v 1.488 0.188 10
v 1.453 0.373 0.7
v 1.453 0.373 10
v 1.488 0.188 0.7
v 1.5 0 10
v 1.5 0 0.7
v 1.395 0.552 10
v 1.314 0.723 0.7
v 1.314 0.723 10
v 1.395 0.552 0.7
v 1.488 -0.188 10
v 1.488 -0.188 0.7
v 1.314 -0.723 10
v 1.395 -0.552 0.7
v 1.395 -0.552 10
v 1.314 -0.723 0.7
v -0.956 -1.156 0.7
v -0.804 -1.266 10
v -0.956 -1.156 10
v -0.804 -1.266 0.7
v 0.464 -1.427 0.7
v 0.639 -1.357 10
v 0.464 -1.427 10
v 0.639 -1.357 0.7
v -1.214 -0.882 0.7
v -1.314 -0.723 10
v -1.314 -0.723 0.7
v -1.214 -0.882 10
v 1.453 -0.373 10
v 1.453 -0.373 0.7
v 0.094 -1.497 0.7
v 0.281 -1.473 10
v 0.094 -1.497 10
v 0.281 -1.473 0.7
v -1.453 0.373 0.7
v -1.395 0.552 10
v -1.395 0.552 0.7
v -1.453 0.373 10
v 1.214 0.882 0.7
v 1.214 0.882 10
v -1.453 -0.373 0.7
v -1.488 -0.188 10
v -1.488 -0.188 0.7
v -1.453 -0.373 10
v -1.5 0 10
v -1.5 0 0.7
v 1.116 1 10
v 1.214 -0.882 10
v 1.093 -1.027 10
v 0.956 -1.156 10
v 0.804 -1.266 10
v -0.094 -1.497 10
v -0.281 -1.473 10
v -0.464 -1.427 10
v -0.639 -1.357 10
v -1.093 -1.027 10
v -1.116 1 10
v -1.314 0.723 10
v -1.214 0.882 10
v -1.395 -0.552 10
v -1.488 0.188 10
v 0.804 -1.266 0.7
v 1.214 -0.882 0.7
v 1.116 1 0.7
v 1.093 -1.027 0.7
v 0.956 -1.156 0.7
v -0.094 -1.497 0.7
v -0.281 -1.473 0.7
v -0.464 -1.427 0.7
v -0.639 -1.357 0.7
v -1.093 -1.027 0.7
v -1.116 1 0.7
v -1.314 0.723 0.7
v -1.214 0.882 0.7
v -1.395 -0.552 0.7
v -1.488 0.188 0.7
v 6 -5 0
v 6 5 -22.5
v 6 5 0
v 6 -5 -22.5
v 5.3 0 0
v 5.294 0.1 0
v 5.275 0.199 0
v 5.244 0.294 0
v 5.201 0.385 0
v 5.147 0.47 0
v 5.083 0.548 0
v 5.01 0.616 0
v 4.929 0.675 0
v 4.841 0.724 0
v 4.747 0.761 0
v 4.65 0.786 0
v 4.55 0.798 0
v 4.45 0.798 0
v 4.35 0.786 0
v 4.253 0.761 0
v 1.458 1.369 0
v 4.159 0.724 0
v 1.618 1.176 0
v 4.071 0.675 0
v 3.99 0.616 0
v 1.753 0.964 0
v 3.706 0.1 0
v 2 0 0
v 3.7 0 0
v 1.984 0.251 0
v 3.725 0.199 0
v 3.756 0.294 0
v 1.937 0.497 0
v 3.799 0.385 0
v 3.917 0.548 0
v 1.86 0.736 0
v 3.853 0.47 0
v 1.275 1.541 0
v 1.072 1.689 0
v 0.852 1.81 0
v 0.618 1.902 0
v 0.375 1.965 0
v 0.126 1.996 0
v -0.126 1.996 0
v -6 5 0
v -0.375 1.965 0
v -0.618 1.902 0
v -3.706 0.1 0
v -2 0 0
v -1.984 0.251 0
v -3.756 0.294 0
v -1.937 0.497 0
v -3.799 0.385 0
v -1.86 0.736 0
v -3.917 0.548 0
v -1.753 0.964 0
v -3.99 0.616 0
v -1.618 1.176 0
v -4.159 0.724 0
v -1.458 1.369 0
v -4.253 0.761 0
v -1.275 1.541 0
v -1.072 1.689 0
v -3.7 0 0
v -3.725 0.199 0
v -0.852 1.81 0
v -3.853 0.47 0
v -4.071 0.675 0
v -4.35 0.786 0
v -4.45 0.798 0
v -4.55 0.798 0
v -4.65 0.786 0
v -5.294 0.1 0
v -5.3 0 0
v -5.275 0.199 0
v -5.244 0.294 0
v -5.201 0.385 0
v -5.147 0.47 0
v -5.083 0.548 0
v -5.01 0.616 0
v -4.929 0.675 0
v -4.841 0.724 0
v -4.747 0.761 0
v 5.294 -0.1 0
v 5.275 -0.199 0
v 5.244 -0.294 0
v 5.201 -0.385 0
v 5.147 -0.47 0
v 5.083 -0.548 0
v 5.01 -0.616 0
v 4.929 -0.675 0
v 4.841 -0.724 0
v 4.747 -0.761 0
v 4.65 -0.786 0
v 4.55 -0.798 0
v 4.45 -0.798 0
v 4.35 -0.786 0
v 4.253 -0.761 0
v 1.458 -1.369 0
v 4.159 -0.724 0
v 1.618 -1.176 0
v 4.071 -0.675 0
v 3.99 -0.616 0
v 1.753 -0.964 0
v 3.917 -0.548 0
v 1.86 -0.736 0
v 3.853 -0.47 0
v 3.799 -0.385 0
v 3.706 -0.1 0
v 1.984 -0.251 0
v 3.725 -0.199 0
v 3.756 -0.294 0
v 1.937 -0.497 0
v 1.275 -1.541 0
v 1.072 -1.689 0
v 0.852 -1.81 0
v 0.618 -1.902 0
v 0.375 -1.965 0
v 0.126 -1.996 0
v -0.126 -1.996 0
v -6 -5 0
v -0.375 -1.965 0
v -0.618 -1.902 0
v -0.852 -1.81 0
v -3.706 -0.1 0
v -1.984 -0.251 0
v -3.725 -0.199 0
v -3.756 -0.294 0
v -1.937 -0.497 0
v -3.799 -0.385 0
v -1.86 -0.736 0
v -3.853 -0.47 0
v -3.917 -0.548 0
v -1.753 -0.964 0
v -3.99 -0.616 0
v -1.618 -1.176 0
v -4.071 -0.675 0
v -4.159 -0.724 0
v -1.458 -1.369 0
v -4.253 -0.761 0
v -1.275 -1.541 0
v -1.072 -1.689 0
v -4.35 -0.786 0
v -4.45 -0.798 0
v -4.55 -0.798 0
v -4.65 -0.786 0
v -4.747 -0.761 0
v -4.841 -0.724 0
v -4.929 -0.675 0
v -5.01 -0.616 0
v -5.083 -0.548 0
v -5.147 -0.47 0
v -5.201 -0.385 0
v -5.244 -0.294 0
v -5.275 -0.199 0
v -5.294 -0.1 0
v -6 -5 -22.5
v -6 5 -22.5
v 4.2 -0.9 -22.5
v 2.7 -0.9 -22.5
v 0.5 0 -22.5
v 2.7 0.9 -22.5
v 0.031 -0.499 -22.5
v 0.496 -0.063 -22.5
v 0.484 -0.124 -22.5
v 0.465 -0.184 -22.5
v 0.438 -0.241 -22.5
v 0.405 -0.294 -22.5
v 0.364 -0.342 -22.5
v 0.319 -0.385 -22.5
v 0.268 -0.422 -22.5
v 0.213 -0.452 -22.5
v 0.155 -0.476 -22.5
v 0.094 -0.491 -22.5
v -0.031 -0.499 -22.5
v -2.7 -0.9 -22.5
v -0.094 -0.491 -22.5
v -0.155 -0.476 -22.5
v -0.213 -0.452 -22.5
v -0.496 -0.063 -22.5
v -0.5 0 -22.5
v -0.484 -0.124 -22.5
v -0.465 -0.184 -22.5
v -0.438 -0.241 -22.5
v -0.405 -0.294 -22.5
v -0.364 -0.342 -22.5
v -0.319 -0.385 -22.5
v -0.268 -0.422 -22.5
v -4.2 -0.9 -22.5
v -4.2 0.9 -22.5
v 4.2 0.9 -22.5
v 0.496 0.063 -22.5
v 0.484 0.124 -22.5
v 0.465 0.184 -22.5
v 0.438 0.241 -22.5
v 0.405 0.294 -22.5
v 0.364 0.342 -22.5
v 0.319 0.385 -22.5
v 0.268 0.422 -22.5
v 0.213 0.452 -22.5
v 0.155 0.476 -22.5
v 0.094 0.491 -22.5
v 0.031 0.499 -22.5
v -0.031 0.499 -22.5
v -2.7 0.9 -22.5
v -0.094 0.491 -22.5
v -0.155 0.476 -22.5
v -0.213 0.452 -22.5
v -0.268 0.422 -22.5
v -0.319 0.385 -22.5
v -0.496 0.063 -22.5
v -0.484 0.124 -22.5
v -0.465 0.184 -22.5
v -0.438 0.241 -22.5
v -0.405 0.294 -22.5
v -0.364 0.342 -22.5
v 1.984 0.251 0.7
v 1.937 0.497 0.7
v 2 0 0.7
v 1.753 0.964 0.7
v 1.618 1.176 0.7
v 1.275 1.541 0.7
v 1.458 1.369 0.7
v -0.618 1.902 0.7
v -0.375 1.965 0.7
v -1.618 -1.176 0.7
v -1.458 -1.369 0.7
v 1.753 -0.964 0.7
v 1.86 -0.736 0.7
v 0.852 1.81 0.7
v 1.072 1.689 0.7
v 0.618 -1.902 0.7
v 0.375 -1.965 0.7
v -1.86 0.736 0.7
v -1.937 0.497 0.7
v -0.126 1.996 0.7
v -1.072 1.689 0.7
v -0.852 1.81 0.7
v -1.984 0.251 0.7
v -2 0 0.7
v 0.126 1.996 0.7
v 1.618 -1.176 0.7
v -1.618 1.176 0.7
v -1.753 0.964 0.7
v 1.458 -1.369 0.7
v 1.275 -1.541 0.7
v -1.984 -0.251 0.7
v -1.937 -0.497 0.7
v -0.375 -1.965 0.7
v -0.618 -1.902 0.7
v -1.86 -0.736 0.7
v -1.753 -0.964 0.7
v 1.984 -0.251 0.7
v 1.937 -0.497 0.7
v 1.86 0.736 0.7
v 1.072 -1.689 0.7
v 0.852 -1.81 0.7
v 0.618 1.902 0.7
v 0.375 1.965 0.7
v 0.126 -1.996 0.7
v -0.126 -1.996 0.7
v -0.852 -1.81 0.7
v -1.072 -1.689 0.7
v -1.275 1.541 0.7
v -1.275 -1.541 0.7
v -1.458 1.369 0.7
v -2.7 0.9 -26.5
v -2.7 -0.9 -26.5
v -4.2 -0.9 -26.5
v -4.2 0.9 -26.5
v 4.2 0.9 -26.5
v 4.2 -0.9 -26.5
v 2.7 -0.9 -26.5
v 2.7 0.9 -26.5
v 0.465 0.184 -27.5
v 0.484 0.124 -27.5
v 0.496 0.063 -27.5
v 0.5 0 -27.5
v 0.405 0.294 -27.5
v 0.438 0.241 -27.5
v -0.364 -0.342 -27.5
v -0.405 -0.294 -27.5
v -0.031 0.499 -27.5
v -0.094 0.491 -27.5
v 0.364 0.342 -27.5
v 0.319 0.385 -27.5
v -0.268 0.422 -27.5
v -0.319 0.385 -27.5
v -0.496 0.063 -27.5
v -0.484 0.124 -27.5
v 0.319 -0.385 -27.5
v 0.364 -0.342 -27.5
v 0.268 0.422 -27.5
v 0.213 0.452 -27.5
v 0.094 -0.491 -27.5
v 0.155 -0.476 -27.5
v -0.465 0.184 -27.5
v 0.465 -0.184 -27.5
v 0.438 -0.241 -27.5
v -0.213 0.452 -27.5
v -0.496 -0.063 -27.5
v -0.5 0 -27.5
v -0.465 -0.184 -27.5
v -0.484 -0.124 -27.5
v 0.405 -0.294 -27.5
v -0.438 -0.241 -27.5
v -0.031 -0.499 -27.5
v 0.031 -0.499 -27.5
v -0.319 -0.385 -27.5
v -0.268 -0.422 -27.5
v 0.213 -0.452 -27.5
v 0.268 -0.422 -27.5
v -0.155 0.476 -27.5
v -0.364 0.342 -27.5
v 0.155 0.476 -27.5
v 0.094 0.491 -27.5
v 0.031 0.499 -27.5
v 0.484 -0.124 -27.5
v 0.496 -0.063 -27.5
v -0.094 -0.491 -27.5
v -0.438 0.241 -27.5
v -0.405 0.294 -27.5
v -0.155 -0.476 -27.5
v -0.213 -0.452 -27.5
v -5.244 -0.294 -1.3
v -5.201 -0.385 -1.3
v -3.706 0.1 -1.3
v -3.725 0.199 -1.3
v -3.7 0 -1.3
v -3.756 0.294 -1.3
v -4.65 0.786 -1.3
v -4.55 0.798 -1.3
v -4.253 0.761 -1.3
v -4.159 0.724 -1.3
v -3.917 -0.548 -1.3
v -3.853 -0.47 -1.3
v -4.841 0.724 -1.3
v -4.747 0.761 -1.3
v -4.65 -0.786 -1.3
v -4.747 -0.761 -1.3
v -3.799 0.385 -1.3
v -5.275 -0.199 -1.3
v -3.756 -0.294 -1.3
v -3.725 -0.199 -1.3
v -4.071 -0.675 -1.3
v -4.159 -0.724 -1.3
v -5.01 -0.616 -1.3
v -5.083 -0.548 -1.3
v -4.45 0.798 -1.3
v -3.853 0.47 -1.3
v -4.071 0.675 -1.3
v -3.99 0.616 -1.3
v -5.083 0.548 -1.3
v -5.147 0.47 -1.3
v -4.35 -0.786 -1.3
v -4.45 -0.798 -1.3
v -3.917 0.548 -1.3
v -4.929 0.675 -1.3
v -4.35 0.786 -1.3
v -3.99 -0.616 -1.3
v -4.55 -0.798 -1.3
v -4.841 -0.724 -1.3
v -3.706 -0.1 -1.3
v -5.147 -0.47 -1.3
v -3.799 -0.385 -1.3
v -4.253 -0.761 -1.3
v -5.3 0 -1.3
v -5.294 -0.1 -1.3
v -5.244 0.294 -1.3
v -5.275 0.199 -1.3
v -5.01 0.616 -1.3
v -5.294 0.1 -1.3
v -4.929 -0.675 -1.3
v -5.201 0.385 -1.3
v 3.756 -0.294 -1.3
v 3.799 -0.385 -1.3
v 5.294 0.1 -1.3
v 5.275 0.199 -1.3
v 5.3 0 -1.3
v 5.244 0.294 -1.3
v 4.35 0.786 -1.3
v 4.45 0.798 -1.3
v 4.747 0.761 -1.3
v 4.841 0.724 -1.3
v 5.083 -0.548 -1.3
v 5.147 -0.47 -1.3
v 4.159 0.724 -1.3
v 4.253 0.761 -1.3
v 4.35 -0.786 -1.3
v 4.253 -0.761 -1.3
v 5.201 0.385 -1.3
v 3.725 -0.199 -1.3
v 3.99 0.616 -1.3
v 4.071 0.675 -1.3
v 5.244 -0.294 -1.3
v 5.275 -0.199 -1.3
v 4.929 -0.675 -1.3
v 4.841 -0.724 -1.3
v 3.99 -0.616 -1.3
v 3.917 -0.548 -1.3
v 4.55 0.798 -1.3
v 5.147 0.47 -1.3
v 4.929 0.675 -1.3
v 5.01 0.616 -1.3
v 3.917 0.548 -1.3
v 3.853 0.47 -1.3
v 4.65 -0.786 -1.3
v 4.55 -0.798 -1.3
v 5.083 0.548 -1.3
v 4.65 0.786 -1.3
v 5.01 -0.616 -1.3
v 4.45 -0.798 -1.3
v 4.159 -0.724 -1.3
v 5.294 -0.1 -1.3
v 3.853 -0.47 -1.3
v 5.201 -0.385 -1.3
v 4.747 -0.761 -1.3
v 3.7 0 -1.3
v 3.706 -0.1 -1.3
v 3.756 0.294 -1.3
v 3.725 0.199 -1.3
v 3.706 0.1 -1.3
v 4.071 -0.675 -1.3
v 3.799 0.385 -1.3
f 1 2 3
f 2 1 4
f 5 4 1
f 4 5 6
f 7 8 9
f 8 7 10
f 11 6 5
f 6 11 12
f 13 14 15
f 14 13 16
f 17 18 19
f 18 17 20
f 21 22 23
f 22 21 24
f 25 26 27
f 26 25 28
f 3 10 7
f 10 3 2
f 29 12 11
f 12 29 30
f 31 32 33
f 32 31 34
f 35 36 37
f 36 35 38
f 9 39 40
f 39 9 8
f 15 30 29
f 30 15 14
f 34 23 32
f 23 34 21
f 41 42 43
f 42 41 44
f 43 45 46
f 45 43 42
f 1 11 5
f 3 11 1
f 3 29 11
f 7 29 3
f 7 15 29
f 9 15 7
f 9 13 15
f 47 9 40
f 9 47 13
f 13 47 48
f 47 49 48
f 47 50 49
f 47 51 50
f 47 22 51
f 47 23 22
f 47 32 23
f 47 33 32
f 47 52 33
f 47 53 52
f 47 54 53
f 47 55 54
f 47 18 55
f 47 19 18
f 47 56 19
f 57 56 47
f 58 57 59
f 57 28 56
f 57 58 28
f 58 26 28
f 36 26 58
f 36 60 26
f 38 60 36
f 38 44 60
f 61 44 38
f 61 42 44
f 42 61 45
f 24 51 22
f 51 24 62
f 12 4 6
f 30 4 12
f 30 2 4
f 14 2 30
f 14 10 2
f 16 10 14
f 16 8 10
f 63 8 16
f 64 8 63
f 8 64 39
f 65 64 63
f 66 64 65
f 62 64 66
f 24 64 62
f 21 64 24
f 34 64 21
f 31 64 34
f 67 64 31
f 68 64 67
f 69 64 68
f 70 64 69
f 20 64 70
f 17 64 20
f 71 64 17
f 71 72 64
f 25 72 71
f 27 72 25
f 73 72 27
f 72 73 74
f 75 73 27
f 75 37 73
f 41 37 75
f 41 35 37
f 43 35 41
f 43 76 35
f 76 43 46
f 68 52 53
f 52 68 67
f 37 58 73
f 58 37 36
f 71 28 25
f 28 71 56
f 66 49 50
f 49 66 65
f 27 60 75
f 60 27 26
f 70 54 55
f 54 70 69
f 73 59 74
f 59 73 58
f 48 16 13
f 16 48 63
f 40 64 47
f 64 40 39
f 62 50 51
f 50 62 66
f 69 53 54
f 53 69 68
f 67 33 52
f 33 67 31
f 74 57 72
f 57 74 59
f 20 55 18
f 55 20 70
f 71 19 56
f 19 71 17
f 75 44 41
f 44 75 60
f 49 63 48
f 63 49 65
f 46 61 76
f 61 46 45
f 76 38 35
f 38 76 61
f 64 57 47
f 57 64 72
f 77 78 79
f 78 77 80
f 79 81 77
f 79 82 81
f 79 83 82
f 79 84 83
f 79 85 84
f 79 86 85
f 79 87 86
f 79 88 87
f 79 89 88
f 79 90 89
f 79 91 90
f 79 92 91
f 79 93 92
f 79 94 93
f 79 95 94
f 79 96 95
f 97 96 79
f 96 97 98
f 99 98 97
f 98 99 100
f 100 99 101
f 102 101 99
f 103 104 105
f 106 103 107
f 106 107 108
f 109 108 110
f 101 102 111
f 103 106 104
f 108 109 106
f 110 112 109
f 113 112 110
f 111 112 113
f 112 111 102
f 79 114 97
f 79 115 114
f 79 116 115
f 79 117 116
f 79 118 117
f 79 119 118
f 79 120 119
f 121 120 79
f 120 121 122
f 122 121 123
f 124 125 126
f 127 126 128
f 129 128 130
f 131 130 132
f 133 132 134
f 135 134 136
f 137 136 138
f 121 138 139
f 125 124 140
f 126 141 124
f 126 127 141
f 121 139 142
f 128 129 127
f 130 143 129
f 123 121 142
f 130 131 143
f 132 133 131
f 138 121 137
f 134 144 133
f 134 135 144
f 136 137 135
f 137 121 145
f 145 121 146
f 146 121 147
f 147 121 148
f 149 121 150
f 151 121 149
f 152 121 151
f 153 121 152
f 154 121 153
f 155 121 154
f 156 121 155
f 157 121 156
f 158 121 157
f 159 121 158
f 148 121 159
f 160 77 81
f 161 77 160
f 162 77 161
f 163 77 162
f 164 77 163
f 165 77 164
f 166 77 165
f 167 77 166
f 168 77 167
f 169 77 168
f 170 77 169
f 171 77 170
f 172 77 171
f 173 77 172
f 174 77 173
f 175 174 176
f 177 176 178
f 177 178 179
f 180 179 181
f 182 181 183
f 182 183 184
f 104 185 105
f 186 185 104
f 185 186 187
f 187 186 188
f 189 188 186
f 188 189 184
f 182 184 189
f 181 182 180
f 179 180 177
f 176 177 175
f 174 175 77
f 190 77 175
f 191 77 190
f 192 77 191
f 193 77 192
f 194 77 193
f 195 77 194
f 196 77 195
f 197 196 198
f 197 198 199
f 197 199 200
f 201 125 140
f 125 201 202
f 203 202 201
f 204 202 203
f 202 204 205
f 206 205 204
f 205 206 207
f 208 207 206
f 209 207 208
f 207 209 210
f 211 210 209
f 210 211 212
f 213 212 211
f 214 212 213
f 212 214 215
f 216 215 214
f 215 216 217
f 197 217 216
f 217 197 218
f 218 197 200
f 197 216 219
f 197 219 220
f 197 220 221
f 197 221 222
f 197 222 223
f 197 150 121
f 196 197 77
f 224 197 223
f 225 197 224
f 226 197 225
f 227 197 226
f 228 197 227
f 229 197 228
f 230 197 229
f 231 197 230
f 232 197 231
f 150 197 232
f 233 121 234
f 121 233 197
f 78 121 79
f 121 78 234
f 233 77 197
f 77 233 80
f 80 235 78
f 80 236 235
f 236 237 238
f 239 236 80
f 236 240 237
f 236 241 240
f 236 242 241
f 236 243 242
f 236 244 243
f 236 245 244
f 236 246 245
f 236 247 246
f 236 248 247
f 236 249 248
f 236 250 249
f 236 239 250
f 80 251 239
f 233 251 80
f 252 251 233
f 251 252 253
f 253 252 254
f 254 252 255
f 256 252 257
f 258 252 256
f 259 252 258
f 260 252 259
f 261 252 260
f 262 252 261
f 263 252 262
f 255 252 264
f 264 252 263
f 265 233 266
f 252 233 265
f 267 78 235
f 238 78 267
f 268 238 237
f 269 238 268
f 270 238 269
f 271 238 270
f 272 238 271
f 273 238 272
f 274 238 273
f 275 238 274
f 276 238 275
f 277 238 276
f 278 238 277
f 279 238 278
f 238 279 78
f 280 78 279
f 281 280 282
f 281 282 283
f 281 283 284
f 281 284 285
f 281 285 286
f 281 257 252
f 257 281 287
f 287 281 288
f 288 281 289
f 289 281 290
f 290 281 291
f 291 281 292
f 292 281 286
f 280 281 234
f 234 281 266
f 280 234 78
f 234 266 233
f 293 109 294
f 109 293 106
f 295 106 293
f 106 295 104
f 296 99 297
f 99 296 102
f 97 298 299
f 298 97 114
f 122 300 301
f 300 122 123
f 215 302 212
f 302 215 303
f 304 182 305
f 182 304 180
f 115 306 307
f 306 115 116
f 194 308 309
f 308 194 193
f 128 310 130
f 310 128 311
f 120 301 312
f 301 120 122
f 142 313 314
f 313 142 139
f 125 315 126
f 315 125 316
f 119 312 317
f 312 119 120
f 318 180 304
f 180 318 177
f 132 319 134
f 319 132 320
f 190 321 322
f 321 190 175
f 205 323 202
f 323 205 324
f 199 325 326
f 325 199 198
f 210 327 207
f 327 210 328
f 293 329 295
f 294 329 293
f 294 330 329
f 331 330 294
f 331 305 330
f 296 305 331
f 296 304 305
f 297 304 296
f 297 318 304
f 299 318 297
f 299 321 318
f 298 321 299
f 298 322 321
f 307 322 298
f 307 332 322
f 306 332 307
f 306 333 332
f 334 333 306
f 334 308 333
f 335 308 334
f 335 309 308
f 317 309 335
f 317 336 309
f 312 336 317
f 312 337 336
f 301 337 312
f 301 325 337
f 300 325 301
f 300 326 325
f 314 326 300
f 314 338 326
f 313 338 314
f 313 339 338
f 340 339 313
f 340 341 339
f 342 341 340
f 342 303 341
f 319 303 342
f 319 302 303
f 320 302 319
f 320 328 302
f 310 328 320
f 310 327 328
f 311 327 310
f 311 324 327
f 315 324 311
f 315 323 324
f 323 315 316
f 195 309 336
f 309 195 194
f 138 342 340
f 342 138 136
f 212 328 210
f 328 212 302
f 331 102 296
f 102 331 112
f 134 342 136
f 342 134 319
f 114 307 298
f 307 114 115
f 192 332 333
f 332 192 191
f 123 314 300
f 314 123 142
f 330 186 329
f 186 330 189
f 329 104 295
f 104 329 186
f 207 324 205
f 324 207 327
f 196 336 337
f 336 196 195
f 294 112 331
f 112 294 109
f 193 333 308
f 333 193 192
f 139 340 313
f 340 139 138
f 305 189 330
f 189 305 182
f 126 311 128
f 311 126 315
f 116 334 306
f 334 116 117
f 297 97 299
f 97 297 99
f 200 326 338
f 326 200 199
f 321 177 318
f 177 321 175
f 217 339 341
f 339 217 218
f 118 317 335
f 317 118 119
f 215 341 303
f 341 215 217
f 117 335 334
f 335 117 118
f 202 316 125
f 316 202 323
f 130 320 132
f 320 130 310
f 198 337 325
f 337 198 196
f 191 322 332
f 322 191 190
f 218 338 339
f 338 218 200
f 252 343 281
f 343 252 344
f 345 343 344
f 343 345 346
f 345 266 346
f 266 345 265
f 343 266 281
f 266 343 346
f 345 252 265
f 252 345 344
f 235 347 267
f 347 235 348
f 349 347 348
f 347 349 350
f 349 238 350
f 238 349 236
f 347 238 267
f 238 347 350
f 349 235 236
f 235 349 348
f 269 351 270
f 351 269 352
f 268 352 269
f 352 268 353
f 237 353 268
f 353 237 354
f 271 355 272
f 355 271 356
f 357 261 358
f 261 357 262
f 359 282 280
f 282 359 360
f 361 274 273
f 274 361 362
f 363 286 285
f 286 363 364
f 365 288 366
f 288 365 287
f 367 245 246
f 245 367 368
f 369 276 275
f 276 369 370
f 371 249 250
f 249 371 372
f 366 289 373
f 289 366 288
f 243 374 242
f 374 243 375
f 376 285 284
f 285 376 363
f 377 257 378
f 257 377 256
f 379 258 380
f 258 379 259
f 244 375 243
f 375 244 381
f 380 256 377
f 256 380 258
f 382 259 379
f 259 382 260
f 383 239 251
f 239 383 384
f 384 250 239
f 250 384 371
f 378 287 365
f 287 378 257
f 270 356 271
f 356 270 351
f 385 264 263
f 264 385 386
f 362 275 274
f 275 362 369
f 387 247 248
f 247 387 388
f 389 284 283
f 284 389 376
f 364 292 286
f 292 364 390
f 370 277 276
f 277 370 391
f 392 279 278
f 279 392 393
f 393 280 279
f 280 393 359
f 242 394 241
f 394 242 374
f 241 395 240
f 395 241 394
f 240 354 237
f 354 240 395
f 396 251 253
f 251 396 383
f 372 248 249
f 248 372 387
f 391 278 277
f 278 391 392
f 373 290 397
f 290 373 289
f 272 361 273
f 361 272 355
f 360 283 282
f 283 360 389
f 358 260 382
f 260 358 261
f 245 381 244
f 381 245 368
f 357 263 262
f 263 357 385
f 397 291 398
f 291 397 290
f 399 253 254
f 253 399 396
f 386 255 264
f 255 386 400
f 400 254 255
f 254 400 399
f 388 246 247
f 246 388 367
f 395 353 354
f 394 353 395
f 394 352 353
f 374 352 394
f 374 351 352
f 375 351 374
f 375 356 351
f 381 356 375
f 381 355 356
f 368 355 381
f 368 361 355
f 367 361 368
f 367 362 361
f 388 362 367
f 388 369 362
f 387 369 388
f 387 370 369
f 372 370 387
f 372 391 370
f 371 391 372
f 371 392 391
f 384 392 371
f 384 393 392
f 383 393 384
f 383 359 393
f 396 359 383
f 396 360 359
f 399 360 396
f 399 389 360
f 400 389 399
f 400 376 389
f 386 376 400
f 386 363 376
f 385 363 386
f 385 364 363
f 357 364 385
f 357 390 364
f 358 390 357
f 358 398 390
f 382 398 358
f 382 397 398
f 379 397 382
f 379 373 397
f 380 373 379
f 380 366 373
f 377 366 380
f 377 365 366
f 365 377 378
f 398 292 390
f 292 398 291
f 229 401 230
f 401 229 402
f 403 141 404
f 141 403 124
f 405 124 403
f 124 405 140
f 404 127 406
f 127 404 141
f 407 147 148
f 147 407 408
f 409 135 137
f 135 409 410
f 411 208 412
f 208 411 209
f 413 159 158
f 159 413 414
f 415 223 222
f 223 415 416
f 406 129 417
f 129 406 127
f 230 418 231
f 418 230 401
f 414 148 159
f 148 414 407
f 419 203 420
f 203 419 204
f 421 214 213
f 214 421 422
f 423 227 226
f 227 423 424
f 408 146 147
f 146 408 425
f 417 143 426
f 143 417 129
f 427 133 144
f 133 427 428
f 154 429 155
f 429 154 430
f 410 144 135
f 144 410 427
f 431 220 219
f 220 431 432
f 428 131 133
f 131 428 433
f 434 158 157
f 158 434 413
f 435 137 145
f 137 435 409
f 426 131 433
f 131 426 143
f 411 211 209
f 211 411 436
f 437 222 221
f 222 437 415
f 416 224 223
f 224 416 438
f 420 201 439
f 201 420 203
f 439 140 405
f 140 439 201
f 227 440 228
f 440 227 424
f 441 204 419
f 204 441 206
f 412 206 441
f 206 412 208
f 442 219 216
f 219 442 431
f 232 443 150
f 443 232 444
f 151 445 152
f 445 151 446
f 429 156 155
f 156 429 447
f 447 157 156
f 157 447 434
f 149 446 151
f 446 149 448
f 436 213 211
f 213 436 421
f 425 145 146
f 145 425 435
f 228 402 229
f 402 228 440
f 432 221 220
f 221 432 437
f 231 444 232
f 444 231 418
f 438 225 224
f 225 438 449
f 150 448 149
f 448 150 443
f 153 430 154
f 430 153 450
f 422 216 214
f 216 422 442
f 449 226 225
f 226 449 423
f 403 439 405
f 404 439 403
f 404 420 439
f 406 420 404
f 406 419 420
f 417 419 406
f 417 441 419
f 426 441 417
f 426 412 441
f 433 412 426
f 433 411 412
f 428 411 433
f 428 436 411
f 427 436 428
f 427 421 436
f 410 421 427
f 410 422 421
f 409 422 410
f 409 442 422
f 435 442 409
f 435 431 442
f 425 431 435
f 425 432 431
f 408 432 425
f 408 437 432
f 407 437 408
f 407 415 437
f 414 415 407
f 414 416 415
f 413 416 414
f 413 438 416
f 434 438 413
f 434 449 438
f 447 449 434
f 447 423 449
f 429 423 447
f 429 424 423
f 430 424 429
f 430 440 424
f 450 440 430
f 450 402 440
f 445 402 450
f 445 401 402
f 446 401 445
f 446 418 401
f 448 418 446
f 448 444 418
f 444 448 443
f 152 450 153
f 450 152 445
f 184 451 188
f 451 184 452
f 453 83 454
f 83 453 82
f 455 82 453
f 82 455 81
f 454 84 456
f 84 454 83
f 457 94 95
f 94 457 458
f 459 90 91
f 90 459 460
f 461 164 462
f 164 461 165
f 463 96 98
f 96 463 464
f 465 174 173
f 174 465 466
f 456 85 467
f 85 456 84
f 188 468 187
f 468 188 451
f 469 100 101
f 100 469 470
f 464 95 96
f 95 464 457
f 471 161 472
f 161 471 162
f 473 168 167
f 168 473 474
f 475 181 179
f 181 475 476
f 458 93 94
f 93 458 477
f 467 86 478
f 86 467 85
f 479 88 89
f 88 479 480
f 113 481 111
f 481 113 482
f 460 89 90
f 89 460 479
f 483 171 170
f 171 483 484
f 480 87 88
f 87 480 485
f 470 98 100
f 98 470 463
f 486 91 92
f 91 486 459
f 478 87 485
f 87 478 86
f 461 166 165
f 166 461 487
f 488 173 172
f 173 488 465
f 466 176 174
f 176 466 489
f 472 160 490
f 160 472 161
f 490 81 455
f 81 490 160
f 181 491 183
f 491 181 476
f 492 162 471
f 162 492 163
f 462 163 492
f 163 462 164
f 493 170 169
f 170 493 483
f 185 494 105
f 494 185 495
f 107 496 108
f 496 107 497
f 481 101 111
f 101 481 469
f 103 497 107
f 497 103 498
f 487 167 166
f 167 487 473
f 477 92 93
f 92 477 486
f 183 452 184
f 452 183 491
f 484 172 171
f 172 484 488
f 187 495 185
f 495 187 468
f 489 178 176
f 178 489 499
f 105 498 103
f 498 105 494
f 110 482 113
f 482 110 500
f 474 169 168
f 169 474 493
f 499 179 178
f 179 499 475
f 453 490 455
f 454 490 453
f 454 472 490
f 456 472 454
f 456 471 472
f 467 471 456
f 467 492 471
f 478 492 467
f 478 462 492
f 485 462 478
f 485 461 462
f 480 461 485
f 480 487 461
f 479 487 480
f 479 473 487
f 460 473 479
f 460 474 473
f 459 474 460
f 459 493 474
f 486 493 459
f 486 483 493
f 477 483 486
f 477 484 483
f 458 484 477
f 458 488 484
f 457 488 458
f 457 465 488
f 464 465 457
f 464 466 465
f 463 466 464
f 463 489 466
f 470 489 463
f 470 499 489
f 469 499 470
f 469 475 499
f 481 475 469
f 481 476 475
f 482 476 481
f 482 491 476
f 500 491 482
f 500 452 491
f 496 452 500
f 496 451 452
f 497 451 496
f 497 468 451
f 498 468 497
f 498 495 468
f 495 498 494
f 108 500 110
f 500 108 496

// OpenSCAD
$fn = 50;

difference() {
	union() {
		translate(v = [0, 0, 0.7]) {
			rotate(a = [0, 0, 0]) {
				difference() {
					union() {
						cylinder(h = 9.3, r = 1.5);
					}
					union() {
						translate(v = [-6.0, 1.0, -1]) {
							cube(size = [12, 12, 11.3]);
						}
					}
				}
			}
		}
		translate(v = [-6.0, -5.0, -9]) {
			cube(size = [12, 10, 9]);
		}
		translate(v = [-6.0, -5.0, -22.5]) {
			cube(size = [12, 10, 13.5]);
		}
		cylinder(h = 0.7, r = 2.0);
		translate(v = [-4.2, -0.9, -26.5]) {
			cube(size = [1.5, 1.8, 4]);
		}
		translate(v = [2.7, -0.9, -26.5]) {
			cube(size = [1.5, 1.8, 4]);
		}
		translate(v = [0, 0, -27.5]) {
			cylinder(h = 5, r = 0.5);
		}
	}
	union() {
		translate(v = [-4.5, 0, -1.3]) {
			cylinder(h = 1.31, r = 0.8);
		}
		translate(v = [4.5, 0, -1.3]) {
			cylinder(h = 1.31, r = 0.8);
		}
	}
}
